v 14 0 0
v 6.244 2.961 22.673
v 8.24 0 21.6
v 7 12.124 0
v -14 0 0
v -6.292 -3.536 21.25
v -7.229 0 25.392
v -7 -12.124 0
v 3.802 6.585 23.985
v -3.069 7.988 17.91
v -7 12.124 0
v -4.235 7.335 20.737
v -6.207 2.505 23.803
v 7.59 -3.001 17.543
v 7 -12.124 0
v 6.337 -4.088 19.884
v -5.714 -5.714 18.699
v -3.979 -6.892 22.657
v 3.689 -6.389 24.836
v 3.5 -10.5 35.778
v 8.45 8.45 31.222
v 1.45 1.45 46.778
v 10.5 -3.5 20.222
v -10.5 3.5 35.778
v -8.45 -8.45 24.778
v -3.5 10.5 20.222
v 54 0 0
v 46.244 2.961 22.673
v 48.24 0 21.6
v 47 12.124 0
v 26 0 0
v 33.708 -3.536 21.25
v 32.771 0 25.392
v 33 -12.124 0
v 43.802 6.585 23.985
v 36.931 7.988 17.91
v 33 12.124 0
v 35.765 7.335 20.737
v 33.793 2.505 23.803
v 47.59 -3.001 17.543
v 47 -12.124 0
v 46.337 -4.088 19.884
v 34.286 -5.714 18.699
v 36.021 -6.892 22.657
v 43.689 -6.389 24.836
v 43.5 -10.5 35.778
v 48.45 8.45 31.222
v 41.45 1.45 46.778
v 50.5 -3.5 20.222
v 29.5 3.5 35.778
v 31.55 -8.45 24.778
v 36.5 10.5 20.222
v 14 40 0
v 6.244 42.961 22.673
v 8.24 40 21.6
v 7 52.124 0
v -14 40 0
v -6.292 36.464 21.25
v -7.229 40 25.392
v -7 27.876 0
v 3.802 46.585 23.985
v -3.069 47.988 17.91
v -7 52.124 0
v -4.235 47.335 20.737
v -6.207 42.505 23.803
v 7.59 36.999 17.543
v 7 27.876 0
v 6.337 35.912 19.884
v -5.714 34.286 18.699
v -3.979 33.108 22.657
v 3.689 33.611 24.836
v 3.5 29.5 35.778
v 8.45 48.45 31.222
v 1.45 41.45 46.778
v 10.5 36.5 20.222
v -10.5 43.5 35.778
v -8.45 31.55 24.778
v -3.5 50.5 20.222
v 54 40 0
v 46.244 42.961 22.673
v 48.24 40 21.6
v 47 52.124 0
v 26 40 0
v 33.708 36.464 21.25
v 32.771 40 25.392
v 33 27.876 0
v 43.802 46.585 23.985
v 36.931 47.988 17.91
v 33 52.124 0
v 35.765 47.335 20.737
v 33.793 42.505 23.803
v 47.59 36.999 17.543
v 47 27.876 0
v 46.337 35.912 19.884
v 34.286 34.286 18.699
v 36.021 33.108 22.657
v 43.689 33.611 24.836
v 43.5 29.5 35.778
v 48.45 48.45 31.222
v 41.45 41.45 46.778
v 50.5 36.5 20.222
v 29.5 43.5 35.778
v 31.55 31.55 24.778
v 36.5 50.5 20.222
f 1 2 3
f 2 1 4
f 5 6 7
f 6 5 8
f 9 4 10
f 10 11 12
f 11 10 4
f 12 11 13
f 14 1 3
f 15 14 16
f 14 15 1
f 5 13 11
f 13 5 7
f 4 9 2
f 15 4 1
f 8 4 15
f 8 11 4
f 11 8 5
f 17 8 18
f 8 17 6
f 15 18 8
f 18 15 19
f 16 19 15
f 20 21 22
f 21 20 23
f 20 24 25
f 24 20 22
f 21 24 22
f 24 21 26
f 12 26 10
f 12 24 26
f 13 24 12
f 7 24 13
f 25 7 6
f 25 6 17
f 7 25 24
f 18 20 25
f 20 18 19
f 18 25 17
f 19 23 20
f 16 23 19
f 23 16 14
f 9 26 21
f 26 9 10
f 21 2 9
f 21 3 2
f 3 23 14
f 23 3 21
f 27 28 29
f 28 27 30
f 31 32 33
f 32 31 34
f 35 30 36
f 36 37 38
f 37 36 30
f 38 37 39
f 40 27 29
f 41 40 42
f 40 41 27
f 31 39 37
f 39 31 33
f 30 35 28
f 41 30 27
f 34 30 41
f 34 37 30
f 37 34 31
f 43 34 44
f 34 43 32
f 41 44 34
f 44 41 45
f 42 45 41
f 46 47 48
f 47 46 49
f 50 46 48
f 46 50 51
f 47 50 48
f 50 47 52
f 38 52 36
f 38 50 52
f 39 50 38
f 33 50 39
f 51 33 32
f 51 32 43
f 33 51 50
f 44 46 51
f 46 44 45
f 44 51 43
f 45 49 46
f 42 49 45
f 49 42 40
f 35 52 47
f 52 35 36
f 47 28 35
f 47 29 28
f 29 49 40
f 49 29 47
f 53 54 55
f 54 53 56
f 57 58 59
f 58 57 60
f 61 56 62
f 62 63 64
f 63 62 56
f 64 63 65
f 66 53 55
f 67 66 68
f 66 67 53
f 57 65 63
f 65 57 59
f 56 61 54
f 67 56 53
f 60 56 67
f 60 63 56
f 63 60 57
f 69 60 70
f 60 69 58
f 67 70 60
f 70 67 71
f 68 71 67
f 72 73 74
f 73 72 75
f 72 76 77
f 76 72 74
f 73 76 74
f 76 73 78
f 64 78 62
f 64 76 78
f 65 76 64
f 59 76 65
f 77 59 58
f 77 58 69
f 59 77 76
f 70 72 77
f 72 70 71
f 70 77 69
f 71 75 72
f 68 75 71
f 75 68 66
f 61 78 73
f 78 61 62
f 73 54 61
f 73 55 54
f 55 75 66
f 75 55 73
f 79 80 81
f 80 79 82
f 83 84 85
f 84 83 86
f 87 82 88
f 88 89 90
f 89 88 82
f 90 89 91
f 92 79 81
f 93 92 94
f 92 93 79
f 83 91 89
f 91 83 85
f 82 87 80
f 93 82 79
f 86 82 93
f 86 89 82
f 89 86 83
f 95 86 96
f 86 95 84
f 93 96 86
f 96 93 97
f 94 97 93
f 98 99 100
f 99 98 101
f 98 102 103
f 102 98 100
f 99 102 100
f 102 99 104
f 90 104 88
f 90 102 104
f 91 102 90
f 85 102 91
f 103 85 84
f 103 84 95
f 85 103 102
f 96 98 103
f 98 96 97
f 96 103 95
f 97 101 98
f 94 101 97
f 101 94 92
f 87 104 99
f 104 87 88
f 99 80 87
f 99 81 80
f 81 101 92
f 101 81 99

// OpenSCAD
// file: ChessLib.scad
$fn = 6;

// Parametric design, allows to control what is printed exactly
printHalfPieces=false;
printAllPieces=true;
printFive=false;
printBoard=true;

module rook(height) {
    ht=height/60;
    // Base
    difference(){
        intersection(){
            translate([0,0,30*ht]) rotate([0,0,45]) cube([24*ht,24*ht,60*ht], center=true);
            translate([0,0,30*ht]) cube([20*ht,20*ht,60*ht], center=true);
        }
        // Crenels
        union(){
            translate([0,0,58.2*ht]) cube([30*ht,4*ht,4*ht],center=true);
            translate([0,0,58.2*ht]) cube([4*ht,30*ht,4*ht],center=true);
        }
    }
}
    


module pawn(height) {
    ht = height/60;
    union(){
        cylinder(h=30*ht,r2=6*ht, r1=14*ht);
        translate([0,0,28*ht]) scale([1.4,1.4,2.2]) rotate([45,45,45]) cube(10,10,10, center=true);
    }
}

module knight(height){
    ht=height/60;
    union(){
        // Base
        cylinder(h=30*ht,r2=6*ht, r1=14*ht);
        // Horse
        polyhedron(
            points = [[7*ht,0,0],[-7*ht,0,0],
                      [-7*ht,-20*ht,40*ht],[7*ht,-20*ht,40*ht],
                      [7*ht,20*ht,60*ht],[-7*ht,20*ht,60*ht]],
    
            faces = [[0,1,2,3],[5,2,1],[5,4,3,2],[0,3,4],[0,4,5,1]]
        );
    }
}

module bishop(height){
    $fn=6;
    ht=height/60;
    cylinder(h=60*ht,r2=2*ht, r1=14*ht);
}

module king(height){
   $fn=3;
   union(){
       ht=height/60;
       // Base 
       cylinder(h=60*ht,r=14*ht);
       rotate([0,0,60]) cylinder(h=60*ht,r=14*ht);
   }
}

module queen(height){
    ht=height/60;
    $fn=6;
    cylinder(h=60*ht,r=14*ht);
}
// main file
include <ChessLib.scad>

$fn = 6;

// "p" or "P" for Pawn
// "r" or "R" for Rook
// "h" or "H" for Knight (Horse :-)
// "b" or "B" for bishop
// "q" or "Q" for Queen
// "k" or "K" for King

/// CONFIG ///

// One set 4*4
/*
pieces = [  ["p", "p", "p", "p"],
            ["P", "p", "p", "P"],
            ["r", "h", "b", "k"],
            ["r", "h", "b", "q"]];
            
numLig = 4;
numCol = 4;
*/

// One set 2*8
/*
pieces = [  ["p", "p", "p", "p", "p", "p", "p", "p"],
            ["r", "h", "b", "q", "k", "b", "h", "r"]];
            
numLig = 2;
numCol = 8;   
*/
// Complet chess game
/*
pieces = [  ["r", "h", "b", "q", "k", "b", "h", "r"],
            ["p", "p", "p", "p", "p", "p", "p", "p"],
            [" ", " ", " ", " ", " ", " ", " ", " "],
            [" ", " ", " ", " ", " ", " ", " ", " "],
            [" ", " ", " ", " ", " ", " ", " ", " "],
            [" ", " ", " ", " ", " ", " ", " ", " "],
            ["p", "p", "p", "p", "p", "p", "p", "p"],
            ["r", "h", "b", "q", "k", "b", "h", "r"]];
numLig = 8;
numCol = 8;            
*/

pieces = [  ["p", "p"],
            ["p", "p"]];

numLig = 2;
numCol = 2; 

stepByLig = 40;
stepByCol = 40;

height = 60;

printBoard = false;
heightCase = 4;

/// END OF CONFIG ///

for (y = [0:numLig-1])
{
    for (x = [0:numCol-1])
    {
        if (printBoard && (x+y) % 2 == 0)
            translate([x*stepByLig-stepByLig/2, y*stepByCol-stepByCol/2,0])
            cube([stepByLig, stepByCol, heightCase]);
            
        translate([x*stepByLig,y*stepByCol,(printBoard) ? heightCase : 0])
        {
            if (pieces[y][x] == "p" || pieces[y][x] == "P") 
                pawn(height);
            else if (pieces[y][x] == "r" || pieces[y][x] == "R")
                rook(height);
            else if (pieces[y][x] == "h" || pieces[y][x] == "H")
                knight(height);
            else if (pieces[y][x] == "b" || pieces[y][x] == "B")
                bishop(height);
            else if (pieces[y][x] == "q" || pieces[y][x] == "Q")
                queen(height);
            else if (pieces[y][x] == "k" || pieces[y][x] == "K")
                king(height);
            else if (pieces[y][x] == " ");
            else
                color("red") cube(stepByLig, center=true);
        }
    }
}
